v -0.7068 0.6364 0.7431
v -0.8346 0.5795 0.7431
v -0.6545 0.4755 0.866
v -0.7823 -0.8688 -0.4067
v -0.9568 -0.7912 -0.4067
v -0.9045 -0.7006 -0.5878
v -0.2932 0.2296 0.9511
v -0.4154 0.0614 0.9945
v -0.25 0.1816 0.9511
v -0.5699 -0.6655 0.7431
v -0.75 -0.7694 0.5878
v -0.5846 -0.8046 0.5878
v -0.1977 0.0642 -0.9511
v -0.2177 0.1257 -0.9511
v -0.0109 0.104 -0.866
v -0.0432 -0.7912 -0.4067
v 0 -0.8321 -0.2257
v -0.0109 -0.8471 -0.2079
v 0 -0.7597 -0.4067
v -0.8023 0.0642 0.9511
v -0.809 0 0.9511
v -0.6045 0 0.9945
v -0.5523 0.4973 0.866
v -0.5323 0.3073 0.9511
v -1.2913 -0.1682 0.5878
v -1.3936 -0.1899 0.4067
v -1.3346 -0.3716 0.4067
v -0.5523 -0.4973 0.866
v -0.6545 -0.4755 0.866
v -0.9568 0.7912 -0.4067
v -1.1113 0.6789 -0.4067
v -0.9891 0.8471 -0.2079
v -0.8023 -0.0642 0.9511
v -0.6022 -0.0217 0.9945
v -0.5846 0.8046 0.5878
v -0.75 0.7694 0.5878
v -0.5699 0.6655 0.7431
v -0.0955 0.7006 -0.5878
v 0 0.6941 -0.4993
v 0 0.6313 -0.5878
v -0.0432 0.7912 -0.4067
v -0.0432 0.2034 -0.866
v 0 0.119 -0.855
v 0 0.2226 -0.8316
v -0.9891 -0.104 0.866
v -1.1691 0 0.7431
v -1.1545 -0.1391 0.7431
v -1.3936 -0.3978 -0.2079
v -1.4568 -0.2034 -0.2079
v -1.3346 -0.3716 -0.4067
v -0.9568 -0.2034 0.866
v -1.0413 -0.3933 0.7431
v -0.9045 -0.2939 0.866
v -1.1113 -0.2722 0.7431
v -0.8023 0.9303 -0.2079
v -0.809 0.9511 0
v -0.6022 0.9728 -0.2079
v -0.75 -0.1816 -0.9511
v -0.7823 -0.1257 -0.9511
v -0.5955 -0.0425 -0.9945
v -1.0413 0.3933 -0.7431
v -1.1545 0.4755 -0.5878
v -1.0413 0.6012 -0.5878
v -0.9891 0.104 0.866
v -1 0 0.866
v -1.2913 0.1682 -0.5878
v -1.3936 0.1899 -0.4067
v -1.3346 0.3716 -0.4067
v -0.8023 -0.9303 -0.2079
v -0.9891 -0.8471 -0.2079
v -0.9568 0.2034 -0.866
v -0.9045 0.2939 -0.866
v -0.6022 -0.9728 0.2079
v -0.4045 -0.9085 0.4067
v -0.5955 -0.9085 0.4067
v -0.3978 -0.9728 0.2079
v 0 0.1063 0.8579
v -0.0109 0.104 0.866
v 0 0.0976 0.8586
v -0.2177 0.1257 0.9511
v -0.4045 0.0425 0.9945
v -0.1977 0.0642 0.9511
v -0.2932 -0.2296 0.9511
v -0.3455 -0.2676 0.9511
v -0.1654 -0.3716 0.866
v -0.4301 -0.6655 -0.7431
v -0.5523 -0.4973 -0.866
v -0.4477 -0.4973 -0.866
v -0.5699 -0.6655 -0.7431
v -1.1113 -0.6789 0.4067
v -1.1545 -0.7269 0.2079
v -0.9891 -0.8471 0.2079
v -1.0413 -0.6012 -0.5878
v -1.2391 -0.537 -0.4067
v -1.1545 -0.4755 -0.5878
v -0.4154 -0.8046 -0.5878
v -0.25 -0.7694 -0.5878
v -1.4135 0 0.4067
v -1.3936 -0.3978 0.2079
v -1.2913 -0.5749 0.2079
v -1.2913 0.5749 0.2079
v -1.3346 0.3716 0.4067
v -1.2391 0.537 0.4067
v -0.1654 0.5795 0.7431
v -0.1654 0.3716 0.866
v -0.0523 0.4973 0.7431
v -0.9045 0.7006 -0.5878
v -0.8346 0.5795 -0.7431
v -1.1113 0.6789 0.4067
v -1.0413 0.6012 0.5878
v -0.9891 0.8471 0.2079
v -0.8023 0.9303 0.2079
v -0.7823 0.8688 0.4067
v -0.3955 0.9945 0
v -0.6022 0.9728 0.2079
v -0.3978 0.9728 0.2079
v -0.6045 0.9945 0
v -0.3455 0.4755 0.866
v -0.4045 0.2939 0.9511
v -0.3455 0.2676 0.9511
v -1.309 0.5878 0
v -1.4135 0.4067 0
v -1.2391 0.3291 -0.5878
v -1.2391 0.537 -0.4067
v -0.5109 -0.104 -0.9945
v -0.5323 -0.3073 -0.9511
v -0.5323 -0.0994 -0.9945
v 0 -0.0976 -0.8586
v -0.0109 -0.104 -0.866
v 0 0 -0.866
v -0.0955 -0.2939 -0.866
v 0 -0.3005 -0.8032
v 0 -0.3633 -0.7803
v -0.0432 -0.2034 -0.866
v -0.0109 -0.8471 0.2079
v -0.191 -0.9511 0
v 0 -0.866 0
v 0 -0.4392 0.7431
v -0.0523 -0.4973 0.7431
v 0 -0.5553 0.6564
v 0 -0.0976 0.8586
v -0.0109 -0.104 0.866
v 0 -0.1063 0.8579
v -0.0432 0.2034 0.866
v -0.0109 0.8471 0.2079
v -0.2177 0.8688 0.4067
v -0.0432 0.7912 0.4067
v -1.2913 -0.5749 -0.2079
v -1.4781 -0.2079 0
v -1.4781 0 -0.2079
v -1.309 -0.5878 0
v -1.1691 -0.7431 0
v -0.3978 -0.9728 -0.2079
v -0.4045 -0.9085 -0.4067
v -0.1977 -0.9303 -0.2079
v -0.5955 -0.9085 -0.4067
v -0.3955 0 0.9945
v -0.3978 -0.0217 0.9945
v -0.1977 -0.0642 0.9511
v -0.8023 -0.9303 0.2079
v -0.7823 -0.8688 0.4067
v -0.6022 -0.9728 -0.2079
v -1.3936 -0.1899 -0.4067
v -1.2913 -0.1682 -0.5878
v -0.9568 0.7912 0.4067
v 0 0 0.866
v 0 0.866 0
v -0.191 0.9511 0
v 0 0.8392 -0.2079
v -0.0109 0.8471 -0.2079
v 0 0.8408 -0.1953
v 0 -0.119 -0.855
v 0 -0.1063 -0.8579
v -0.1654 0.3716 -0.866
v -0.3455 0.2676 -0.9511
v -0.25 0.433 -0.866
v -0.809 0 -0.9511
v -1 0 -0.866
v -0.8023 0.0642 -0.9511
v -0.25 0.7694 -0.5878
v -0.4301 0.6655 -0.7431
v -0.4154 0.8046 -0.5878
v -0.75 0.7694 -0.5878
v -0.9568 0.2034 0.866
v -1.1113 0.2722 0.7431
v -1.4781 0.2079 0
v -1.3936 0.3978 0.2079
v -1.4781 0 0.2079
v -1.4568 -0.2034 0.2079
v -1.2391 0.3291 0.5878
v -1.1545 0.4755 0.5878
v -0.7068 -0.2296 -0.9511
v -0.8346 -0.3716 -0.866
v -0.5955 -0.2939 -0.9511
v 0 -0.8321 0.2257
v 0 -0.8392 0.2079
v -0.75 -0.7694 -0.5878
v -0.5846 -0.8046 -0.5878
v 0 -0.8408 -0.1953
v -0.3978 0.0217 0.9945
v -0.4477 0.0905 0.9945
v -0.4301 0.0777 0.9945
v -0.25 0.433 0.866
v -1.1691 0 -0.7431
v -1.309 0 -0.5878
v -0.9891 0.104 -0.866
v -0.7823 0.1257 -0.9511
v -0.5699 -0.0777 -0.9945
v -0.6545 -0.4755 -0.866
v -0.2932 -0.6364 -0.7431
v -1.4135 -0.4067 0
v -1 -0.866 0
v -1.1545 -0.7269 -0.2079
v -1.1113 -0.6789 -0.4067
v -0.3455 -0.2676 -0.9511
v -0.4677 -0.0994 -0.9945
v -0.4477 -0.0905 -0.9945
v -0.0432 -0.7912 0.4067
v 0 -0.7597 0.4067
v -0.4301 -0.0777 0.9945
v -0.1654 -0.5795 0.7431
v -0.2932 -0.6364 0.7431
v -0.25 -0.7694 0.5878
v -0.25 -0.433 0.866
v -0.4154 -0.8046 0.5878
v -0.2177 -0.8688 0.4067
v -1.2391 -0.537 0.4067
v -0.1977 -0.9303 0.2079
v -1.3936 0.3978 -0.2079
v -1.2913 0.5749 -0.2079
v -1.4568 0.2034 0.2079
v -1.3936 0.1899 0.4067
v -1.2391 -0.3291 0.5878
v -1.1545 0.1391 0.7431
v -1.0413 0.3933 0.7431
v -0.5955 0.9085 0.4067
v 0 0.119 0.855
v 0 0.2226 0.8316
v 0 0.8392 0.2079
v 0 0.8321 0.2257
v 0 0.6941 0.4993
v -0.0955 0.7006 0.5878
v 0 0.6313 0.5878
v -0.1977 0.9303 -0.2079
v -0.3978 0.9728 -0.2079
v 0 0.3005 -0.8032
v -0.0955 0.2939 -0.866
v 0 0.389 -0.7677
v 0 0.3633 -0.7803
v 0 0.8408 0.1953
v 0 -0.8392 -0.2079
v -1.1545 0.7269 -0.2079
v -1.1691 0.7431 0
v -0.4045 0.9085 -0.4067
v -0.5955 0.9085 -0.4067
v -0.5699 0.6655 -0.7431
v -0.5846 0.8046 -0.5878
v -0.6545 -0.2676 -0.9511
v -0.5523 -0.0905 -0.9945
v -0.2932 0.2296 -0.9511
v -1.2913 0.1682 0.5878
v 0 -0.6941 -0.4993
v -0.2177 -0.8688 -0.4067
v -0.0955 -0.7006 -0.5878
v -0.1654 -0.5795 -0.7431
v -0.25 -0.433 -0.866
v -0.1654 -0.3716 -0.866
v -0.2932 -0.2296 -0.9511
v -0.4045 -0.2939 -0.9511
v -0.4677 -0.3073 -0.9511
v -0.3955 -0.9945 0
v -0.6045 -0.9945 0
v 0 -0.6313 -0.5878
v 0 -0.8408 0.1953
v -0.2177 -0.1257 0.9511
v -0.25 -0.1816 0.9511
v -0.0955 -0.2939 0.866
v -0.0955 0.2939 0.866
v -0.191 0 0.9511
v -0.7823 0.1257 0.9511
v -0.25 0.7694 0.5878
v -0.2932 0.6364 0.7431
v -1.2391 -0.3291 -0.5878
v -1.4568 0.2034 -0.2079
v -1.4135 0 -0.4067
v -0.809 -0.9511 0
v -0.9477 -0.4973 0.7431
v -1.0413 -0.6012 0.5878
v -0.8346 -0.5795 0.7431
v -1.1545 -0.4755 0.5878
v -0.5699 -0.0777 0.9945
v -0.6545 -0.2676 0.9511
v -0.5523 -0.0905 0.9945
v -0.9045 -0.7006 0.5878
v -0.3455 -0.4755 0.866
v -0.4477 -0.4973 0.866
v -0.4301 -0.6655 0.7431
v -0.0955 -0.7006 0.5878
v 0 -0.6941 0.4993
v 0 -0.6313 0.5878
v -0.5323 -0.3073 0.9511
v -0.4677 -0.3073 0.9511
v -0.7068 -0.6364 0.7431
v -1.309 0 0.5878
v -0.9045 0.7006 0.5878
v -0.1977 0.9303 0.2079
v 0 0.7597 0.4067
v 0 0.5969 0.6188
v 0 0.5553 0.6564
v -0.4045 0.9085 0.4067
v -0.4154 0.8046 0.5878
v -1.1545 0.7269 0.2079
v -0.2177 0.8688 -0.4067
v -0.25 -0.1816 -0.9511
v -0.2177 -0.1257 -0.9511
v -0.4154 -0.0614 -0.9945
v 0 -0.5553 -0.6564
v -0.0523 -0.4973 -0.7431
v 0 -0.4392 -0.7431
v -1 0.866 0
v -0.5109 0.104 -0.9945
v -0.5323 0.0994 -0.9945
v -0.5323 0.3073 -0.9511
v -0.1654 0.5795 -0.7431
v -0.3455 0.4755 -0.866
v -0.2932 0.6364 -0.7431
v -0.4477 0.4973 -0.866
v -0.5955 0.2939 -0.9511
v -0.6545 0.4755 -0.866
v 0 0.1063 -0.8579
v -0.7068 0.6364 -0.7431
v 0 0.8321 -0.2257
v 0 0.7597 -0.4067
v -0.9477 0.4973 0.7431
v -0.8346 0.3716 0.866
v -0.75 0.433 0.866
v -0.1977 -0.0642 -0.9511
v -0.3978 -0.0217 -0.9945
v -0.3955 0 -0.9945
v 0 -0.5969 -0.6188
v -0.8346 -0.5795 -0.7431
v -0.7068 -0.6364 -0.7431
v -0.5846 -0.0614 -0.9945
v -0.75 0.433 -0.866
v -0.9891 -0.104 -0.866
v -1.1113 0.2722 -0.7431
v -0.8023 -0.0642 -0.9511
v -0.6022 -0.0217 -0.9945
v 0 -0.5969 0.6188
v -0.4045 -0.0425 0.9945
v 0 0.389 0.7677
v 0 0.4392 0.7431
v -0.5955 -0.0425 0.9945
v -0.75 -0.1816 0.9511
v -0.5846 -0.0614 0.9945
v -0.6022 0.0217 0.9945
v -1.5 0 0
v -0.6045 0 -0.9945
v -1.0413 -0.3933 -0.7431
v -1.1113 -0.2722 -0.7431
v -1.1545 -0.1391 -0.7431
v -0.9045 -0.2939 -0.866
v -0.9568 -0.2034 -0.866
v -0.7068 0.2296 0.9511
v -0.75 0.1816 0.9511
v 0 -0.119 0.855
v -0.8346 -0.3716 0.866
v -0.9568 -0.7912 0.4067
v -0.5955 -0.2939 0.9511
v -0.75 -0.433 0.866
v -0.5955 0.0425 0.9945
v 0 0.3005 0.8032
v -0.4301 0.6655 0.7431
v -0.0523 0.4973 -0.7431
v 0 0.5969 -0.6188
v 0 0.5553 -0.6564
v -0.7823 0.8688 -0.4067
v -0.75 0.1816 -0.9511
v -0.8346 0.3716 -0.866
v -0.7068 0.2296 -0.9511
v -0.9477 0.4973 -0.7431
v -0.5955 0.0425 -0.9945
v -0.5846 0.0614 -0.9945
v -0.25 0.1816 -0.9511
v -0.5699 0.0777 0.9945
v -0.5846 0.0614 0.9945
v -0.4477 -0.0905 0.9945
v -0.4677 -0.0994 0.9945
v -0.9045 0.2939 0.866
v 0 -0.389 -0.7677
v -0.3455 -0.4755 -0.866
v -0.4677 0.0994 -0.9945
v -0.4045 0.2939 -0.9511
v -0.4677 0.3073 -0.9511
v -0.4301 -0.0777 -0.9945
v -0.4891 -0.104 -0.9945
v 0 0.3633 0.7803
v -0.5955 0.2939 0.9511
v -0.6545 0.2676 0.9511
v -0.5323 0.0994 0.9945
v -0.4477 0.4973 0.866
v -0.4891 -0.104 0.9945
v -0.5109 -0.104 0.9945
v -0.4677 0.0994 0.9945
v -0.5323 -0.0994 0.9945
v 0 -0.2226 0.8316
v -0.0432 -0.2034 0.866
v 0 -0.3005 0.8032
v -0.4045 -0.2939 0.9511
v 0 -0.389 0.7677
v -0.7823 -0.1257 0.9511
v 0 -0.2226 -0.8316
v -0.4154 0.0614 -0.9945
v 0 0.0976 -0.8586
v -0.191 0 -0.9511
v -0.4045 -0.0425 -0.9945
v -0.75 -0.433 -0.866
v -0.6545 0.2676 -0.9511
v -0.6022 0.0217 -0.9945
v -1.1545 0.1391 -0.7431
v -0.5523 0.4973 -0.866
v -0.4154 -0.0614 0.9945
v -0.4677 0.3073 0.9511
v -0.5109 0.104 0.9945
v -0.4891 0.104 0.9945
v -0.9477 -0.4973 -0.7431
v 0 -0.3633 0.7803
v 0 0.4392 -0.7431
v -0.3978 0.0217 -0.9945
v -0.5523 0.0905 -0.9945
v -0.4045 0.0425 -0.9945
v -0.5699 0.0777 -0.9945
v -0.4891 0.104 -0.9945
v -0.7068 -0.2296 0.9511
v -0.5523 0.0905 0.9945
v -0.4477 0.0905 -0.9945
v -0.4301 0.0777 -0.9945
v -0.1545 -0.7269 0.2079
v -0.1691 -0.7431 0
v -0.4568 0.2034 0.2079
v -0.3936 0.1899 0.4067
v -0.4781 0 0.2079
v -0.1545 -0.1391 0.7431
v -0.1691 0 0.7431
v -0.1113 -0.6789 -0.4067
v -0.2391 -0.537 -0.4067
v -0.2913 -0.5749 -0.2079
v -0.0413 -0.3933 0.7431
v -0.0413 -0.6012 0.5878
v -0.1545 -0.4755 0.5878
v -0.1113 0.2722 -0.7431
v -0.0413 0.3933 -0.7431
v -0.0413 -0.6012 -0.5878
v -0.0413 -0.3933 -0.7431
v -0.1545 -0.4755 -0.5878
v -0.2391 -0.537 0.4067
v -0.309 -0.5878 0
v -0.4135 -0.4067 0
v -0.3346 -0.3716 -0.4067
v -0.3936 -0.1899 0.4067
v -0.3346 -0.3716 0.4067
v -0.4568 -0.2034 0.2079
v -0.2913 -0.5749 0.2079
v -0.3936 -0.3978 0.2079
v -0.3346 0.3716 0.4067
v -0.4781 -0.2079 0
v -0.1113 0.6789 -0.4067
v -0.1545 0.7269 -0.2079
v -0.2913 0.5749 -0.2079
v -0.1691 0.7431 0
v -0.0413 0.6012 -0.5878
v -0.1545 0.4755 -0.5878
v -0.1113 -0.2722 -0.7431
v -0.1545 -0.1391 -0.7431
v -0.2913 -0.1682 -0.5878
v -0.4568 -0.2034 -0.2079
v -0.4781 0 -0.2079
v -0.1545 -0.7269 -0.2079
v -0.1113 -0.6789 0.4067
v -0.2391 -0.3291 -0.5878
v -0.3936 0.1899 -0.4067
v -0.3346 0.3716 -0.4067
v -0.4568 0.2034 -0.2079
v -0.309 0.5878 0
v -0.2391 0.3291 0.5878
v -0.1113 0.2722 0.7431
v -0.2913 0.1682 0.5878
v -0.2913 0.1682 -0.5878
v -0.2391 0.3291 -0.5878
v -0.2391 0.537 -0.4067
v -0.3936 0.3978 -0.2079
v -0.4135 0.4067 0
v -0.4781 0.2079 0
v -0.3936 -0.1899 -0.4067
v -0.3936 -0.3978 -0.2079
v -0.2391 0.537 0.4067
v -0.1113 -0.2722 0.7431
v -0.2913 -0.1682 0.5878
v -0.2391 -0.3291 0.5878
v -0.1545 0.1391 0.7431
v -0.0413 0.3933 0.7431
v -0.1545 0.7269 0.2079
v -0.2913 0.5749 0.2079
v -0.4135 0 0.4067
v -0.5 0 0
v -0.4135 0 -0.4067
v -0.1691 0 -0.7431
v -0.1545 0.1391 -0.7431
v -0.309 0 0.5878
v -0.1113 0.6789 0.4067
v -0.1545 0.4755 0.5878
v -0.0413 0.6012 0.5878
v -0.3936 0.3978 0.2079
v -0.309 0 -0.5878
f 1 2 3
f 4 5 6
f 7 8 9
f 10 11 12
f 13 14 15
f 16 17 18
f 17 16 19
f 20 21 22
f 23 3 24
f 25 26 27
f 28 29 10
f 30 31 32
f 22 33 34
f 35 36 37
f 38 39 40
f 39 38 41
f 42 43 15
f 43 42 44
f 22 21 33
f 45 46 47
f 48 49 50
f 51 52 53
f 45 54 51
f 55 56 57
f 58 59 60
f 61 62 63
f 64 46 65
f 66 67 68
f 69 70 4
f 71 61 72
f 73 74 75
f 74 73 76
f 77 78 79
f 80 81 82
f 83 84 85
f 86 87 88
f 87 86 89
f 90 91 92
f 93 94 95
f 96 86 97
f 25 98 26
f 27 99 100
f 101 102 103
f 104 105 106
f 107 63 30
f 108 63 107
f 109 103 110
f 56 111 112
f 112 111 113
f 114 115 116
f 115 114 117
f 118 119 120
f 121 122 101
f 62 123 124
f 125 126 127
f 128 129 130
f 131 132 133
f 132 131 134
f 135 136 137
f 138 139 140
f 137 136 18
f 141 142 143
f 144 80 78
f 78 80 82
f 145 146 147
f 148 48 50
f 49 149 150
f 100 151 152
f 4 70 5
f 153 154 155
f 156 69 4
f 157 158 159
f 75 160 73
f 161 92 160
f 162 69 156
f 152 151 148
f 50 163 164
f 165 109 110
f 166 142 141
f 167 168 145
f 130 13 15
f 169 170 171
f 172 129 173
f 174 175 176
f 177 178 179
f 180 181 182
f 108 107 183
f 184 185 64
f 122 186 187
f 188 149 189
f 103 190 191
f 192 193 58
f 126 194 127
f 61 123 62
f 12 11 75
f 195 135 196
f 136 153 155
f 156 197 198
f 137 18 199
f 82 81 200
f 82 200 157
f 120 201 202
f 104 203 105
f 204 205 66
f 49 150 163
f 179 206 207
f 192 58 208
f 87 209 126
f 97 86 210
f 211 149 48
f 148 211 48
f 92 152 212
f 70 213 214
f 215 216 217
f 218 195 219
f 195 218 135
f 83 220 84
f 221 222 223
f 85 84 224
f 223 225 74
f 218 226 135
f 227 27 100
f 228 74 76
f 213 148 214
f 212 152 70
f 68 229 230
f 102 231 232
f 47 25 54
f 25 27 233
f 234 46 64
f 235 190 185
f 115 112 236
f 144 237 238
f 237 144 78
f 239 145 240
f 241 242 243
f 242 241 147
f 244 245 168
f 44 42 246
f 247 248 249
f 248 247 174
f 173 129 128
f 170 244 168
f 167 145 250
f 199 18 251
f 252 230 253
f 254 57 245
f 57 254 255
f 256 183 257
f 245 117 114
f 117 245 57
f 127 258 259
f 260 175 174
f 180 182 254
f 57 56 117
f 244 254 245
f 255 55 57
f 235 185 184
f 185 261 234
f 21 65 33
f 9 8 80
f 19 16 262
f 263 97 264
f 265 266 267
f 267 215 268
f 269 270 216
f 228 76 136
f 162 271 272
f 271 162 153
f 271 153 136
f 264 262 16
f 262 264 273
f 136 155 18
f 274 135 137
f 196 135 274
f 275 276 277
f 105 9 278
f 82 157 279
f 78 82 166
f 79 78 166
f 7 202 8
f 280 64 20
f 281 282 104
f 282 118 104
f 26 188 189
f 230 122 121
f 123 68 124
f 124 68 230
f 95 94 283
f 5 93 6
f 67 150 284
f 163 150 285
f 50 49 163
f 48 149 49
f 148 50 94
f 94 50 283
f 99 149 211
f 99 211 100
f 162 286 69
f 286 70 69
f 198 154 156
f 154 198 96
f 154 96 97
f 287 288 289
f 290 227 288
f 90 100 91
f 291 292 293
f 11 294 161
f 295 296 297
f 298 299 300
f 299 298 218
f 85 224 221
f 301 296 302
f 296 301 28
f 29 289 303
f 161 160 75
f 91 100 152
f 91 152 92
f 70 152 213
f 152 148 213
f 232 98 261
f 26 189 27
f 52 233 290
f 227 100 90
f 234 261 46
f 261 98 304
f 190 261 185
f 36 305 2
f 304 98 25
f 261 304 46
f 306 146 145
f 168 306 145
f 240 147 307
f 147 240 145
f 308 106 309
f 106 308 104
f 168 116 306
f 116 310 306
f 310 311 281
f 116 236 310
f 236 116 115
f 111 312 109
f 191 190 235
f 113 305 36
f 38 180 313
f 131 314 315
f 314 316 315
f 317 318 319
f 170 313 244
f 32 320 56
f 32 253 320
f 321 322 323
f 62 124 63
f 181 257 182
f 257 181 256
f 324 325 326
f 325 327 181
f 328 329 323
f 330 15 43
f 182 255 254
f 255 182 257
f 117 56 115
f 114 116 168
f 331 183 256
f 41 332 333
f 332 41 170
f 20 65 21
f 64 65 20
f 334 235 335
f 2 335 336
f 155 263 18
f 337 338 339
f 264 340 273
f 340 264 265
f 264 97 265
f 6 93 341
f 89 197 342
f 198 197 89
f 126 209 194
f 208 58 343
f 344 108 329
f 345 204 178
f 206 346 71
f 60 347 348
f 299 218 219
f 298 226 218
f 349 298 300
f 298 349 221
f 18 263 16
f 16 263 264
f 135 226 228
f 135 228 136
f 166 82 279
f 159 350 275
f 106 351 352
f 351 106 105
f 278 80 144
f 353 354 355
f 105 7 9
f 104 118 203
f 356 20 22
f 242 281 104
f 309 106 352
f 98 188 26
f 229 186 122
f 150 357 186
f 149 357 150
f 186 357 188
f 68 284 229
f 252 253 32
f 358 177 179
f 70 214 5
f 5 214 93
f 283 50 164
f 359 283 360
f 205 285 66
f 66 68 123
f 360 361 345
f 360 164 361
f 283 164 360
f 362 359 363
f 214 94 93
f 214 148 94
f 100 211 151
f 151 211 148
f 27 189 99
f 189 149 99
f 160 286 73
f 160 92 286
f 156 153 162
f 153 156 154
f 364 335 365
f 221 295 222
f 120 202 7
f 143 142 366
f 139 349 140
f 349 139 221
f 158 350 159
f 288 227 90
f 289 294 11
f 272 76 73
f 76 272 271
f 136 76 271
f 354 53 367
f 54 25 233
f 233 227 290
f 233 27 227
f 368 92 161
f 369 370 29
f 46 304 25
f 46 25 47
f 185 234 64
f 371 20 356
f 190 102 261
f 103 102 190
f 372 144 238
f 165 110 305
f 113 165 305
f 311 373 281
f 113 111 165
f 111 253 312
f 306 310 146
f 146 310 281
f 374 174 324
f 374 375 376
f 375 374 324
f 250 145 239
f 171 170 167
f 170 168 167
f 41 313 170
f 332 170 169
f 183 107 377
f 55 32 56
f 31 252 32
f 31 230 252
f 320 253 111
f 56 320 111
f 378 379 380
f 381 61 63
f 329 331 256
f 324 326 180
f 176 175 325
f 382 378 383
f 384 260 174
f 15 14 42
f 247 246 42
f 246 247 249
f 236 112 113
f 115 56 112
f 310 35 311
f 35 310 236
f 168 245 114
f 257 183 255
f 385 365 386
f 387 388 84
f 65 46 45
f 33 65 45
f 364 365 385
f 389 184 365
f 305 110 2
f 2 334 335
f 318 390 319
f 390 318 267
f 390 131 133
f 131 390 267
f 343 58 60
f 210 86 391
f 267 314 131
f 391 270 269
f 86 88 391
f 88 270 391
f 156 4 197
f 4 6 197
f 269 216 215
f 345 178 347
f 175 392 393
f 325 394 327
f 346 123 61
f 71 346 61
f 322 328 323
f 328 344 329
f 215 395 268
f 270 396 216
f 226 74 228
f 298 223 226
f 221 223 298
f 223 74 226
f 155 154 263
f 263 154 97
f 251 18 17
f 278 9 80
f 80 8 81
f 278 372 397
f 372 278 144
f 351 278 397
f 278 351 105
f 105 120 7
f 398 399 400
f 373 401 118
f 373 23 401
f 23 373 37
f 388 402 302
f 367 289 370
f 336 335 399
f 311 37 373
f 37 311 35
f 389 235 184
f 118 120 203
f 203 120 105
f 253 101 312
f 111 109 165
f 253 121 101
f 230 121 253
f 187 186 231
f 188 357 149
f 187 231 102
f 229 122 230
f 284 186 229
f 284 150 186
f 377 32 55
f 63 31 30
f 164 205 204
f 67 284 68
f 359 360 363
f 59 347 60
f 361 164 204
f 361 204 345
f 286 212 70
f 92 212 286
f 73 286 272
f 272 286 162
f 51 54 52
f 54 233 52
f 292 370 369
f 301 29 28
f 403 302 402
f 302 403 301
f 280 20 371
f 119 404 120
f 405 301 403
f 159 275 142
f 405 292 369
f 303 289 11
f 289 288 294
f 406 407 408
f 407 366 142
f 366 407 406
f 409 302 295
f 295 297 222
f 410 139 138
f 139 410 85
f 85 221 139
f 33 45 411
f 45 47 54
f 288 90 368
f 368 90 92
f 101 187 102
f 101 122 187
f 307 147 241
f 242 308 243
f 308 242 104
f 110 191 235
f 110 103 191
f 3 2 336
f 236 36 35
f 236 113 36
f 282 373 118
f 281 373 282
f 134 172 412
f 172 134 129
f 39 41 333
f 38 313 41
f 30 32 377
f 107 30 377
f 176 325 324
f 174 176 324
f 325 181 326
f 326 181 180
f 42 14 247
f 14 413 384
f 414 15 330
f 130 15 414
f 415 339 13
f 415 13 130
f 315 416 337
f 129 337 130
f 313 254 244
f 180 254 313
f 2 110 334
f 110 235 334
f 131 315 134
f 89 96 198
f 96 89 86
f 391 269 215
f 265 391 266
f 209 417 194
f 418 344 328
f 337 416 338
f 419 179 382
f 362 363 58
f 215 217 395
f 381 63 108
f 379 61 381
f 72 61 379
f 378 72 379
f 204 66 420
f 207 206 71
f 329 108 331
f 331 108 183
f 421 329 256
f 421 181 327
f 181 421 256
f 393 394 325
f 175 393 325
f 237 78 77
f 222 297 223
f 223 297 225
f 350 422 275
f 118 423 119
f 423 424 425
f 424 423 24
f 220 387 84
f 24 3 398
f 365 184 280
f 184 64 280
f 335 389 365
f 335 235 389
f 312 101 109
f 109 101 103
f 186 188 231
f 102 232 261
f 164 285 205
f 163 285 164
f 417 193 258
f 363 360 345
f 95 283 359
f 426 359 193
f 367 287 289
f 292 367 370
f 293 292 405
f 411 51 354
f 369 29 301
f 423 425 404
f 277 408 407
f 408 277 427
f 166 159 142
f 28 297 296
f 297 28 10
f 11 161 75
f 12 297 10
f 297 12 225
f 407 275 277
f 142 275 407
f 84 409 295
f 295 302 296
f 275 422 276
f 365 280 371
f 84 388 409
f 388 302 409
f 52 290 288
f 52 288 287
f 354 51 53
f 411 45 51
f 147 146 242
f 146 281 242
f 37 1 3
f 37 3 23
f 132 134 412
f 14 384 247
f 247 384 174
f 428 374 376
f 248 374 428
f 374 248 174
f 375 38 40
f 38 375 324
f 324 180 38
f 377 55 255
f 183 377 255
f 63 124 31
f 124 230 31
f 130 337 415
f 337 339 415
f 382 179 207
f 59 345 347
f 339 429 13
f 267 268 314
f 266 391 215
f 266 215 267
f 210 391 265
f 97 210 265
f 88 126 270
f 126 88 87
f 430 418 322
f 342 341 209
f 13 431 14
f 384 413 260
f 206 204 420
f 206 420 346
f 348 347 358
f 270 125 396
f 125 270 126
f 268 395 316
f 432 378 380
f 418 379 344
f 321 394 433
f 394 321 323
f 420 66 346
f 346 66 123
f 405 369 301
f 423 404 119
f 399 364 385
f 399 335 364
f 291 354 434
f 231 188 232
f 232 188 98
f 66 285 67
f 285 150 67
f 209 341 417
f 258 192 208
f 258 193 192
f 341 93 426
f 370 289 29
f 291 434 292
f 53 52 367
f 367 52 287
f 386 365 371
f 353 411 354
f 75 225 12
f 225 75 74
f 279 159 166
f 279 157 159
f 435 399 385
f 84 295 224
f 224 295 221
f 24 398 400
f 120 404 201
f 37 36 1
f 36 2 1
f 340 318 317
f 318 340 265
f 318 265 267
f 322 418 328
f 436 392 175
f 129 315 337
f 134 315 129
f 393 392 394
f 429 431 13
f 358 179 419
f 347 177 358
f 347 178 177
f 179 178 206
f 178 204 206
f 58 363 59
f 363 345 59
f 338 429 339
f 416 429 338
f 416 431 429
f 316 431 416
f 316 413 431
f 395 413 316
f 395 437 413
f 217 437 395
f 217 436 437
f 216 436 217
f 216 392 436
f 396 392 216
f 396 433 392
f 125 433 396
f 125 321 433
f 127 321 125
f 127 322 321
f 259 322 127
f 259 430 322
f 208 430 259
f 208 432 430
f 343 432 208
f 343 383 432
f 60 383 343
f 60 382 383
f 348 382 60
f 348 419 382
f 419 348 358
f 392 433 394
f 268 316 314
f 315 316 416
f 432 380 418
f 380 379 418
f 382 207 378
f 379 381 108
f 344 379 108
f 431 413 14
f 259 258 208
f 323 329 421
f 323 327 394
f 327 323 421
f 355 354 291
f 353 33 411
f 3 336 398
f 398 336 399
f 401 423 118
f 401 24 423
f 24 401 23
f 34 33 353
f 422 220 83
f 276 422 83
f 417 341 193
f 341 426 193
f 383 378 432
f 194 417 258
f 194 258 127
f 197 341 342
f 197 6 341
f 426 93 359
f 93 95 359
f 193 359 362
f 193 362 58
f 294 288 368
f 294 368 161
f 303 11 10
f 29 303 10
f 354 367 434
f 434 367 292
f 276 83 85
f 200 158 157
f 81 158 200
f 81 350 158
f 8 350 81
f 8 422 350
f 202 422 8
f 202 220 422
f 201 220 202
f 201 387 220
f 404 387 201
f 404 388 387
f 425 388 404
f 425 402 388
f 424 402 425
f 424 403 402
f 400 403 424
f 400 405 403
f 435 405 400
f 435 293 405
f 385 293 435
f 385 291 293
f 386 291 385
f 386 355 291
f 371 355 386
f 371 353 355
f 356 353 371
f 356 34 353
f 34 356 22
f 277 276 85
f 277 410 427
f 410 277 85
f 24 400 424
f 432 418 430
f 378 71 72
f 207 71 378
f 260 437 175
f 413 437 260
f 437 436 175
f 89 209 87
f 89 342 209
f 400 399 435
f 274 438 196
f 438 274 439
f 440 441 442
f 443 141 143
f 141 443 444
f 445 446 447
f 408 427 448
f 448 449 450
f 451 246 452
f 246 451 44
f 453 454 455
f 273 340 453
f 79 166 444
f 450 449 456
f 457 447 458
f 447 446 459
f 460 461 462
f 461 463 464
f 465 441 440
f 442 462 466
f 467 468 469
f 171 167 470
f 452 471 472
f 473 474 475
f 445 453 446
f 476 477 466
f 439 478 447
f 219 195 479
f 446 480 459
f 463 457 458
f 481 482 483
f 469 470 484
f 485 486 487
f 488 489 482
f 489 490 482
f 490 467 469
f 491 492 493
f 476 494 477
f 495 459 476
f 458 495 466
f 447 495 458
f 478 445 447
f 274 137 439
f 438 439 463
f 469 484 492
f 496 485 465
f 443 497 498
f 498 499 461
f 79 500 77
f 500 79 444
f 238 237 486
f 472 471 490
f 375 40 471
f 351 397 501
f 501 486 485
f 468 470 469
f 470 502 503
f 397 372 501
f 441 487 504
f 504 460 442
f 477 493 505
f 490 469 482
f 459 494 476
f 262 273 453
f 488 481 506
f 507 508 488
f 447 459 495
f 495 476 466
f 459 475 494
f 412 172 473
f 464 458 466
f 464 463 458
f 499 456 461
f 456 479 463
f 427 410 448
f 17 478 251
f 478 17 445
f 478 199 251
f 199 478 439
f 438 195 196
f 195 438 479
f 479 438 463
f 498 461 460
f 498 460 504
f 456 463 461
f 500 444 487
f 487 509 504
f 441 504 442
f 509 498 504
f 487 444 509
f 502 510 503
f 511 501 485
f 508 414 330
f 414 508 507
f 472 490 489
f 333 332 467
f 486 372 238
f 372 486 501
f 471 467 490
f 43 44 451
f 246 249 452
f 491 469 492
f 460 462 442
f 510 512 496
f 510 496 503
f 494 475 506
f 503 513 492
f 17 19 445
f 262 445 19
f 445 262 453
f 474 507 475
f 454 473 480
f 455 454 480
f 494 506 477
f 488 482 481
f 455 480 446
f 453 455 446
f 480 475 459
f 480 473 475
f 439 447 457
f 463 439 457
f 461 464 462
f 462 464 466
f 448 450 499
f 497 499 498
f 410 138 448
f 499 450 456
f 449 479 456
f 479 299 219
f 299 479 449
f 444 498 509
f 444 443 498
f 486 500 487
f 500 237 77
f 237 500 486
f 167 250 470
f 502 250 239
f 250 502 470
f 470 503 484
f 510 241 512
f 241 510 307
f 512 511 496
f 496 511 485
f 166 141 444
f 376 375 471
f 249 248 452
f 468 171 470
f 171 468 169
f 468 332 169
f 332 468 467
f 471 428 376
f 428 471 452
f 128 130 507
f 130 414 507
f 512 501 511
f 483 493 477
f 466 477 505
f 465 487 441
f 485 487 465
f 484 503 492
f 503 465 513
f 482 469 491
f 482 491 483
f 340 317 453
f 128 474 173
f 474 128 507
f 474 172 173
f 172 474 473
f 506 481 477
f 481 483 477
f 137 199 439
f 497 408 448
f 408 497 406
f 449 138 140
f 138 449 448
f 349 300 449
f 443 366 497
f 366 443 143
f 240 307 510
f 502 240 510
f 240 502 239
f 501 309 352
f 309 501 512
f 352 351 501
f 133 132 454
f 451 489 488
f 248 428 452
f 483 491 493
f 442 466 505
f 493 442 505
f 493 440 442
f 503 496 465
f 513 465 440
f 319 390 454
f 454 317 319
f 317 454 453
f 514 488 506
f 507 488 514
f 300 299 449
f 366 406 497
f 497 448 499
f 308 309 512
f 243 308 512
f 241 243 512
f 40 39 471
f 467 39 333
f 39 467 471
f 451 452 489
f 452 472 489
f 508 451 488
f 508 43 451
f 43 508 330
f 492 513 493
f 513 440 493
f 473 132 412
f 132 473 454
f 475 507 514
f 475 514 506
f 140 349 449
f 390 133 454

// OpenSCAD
$fn = 30;
difference() {
  translate([-0.5, 0, 0]) sphere();
  translate([ 0.5, 0, 0]) sphere();
}
